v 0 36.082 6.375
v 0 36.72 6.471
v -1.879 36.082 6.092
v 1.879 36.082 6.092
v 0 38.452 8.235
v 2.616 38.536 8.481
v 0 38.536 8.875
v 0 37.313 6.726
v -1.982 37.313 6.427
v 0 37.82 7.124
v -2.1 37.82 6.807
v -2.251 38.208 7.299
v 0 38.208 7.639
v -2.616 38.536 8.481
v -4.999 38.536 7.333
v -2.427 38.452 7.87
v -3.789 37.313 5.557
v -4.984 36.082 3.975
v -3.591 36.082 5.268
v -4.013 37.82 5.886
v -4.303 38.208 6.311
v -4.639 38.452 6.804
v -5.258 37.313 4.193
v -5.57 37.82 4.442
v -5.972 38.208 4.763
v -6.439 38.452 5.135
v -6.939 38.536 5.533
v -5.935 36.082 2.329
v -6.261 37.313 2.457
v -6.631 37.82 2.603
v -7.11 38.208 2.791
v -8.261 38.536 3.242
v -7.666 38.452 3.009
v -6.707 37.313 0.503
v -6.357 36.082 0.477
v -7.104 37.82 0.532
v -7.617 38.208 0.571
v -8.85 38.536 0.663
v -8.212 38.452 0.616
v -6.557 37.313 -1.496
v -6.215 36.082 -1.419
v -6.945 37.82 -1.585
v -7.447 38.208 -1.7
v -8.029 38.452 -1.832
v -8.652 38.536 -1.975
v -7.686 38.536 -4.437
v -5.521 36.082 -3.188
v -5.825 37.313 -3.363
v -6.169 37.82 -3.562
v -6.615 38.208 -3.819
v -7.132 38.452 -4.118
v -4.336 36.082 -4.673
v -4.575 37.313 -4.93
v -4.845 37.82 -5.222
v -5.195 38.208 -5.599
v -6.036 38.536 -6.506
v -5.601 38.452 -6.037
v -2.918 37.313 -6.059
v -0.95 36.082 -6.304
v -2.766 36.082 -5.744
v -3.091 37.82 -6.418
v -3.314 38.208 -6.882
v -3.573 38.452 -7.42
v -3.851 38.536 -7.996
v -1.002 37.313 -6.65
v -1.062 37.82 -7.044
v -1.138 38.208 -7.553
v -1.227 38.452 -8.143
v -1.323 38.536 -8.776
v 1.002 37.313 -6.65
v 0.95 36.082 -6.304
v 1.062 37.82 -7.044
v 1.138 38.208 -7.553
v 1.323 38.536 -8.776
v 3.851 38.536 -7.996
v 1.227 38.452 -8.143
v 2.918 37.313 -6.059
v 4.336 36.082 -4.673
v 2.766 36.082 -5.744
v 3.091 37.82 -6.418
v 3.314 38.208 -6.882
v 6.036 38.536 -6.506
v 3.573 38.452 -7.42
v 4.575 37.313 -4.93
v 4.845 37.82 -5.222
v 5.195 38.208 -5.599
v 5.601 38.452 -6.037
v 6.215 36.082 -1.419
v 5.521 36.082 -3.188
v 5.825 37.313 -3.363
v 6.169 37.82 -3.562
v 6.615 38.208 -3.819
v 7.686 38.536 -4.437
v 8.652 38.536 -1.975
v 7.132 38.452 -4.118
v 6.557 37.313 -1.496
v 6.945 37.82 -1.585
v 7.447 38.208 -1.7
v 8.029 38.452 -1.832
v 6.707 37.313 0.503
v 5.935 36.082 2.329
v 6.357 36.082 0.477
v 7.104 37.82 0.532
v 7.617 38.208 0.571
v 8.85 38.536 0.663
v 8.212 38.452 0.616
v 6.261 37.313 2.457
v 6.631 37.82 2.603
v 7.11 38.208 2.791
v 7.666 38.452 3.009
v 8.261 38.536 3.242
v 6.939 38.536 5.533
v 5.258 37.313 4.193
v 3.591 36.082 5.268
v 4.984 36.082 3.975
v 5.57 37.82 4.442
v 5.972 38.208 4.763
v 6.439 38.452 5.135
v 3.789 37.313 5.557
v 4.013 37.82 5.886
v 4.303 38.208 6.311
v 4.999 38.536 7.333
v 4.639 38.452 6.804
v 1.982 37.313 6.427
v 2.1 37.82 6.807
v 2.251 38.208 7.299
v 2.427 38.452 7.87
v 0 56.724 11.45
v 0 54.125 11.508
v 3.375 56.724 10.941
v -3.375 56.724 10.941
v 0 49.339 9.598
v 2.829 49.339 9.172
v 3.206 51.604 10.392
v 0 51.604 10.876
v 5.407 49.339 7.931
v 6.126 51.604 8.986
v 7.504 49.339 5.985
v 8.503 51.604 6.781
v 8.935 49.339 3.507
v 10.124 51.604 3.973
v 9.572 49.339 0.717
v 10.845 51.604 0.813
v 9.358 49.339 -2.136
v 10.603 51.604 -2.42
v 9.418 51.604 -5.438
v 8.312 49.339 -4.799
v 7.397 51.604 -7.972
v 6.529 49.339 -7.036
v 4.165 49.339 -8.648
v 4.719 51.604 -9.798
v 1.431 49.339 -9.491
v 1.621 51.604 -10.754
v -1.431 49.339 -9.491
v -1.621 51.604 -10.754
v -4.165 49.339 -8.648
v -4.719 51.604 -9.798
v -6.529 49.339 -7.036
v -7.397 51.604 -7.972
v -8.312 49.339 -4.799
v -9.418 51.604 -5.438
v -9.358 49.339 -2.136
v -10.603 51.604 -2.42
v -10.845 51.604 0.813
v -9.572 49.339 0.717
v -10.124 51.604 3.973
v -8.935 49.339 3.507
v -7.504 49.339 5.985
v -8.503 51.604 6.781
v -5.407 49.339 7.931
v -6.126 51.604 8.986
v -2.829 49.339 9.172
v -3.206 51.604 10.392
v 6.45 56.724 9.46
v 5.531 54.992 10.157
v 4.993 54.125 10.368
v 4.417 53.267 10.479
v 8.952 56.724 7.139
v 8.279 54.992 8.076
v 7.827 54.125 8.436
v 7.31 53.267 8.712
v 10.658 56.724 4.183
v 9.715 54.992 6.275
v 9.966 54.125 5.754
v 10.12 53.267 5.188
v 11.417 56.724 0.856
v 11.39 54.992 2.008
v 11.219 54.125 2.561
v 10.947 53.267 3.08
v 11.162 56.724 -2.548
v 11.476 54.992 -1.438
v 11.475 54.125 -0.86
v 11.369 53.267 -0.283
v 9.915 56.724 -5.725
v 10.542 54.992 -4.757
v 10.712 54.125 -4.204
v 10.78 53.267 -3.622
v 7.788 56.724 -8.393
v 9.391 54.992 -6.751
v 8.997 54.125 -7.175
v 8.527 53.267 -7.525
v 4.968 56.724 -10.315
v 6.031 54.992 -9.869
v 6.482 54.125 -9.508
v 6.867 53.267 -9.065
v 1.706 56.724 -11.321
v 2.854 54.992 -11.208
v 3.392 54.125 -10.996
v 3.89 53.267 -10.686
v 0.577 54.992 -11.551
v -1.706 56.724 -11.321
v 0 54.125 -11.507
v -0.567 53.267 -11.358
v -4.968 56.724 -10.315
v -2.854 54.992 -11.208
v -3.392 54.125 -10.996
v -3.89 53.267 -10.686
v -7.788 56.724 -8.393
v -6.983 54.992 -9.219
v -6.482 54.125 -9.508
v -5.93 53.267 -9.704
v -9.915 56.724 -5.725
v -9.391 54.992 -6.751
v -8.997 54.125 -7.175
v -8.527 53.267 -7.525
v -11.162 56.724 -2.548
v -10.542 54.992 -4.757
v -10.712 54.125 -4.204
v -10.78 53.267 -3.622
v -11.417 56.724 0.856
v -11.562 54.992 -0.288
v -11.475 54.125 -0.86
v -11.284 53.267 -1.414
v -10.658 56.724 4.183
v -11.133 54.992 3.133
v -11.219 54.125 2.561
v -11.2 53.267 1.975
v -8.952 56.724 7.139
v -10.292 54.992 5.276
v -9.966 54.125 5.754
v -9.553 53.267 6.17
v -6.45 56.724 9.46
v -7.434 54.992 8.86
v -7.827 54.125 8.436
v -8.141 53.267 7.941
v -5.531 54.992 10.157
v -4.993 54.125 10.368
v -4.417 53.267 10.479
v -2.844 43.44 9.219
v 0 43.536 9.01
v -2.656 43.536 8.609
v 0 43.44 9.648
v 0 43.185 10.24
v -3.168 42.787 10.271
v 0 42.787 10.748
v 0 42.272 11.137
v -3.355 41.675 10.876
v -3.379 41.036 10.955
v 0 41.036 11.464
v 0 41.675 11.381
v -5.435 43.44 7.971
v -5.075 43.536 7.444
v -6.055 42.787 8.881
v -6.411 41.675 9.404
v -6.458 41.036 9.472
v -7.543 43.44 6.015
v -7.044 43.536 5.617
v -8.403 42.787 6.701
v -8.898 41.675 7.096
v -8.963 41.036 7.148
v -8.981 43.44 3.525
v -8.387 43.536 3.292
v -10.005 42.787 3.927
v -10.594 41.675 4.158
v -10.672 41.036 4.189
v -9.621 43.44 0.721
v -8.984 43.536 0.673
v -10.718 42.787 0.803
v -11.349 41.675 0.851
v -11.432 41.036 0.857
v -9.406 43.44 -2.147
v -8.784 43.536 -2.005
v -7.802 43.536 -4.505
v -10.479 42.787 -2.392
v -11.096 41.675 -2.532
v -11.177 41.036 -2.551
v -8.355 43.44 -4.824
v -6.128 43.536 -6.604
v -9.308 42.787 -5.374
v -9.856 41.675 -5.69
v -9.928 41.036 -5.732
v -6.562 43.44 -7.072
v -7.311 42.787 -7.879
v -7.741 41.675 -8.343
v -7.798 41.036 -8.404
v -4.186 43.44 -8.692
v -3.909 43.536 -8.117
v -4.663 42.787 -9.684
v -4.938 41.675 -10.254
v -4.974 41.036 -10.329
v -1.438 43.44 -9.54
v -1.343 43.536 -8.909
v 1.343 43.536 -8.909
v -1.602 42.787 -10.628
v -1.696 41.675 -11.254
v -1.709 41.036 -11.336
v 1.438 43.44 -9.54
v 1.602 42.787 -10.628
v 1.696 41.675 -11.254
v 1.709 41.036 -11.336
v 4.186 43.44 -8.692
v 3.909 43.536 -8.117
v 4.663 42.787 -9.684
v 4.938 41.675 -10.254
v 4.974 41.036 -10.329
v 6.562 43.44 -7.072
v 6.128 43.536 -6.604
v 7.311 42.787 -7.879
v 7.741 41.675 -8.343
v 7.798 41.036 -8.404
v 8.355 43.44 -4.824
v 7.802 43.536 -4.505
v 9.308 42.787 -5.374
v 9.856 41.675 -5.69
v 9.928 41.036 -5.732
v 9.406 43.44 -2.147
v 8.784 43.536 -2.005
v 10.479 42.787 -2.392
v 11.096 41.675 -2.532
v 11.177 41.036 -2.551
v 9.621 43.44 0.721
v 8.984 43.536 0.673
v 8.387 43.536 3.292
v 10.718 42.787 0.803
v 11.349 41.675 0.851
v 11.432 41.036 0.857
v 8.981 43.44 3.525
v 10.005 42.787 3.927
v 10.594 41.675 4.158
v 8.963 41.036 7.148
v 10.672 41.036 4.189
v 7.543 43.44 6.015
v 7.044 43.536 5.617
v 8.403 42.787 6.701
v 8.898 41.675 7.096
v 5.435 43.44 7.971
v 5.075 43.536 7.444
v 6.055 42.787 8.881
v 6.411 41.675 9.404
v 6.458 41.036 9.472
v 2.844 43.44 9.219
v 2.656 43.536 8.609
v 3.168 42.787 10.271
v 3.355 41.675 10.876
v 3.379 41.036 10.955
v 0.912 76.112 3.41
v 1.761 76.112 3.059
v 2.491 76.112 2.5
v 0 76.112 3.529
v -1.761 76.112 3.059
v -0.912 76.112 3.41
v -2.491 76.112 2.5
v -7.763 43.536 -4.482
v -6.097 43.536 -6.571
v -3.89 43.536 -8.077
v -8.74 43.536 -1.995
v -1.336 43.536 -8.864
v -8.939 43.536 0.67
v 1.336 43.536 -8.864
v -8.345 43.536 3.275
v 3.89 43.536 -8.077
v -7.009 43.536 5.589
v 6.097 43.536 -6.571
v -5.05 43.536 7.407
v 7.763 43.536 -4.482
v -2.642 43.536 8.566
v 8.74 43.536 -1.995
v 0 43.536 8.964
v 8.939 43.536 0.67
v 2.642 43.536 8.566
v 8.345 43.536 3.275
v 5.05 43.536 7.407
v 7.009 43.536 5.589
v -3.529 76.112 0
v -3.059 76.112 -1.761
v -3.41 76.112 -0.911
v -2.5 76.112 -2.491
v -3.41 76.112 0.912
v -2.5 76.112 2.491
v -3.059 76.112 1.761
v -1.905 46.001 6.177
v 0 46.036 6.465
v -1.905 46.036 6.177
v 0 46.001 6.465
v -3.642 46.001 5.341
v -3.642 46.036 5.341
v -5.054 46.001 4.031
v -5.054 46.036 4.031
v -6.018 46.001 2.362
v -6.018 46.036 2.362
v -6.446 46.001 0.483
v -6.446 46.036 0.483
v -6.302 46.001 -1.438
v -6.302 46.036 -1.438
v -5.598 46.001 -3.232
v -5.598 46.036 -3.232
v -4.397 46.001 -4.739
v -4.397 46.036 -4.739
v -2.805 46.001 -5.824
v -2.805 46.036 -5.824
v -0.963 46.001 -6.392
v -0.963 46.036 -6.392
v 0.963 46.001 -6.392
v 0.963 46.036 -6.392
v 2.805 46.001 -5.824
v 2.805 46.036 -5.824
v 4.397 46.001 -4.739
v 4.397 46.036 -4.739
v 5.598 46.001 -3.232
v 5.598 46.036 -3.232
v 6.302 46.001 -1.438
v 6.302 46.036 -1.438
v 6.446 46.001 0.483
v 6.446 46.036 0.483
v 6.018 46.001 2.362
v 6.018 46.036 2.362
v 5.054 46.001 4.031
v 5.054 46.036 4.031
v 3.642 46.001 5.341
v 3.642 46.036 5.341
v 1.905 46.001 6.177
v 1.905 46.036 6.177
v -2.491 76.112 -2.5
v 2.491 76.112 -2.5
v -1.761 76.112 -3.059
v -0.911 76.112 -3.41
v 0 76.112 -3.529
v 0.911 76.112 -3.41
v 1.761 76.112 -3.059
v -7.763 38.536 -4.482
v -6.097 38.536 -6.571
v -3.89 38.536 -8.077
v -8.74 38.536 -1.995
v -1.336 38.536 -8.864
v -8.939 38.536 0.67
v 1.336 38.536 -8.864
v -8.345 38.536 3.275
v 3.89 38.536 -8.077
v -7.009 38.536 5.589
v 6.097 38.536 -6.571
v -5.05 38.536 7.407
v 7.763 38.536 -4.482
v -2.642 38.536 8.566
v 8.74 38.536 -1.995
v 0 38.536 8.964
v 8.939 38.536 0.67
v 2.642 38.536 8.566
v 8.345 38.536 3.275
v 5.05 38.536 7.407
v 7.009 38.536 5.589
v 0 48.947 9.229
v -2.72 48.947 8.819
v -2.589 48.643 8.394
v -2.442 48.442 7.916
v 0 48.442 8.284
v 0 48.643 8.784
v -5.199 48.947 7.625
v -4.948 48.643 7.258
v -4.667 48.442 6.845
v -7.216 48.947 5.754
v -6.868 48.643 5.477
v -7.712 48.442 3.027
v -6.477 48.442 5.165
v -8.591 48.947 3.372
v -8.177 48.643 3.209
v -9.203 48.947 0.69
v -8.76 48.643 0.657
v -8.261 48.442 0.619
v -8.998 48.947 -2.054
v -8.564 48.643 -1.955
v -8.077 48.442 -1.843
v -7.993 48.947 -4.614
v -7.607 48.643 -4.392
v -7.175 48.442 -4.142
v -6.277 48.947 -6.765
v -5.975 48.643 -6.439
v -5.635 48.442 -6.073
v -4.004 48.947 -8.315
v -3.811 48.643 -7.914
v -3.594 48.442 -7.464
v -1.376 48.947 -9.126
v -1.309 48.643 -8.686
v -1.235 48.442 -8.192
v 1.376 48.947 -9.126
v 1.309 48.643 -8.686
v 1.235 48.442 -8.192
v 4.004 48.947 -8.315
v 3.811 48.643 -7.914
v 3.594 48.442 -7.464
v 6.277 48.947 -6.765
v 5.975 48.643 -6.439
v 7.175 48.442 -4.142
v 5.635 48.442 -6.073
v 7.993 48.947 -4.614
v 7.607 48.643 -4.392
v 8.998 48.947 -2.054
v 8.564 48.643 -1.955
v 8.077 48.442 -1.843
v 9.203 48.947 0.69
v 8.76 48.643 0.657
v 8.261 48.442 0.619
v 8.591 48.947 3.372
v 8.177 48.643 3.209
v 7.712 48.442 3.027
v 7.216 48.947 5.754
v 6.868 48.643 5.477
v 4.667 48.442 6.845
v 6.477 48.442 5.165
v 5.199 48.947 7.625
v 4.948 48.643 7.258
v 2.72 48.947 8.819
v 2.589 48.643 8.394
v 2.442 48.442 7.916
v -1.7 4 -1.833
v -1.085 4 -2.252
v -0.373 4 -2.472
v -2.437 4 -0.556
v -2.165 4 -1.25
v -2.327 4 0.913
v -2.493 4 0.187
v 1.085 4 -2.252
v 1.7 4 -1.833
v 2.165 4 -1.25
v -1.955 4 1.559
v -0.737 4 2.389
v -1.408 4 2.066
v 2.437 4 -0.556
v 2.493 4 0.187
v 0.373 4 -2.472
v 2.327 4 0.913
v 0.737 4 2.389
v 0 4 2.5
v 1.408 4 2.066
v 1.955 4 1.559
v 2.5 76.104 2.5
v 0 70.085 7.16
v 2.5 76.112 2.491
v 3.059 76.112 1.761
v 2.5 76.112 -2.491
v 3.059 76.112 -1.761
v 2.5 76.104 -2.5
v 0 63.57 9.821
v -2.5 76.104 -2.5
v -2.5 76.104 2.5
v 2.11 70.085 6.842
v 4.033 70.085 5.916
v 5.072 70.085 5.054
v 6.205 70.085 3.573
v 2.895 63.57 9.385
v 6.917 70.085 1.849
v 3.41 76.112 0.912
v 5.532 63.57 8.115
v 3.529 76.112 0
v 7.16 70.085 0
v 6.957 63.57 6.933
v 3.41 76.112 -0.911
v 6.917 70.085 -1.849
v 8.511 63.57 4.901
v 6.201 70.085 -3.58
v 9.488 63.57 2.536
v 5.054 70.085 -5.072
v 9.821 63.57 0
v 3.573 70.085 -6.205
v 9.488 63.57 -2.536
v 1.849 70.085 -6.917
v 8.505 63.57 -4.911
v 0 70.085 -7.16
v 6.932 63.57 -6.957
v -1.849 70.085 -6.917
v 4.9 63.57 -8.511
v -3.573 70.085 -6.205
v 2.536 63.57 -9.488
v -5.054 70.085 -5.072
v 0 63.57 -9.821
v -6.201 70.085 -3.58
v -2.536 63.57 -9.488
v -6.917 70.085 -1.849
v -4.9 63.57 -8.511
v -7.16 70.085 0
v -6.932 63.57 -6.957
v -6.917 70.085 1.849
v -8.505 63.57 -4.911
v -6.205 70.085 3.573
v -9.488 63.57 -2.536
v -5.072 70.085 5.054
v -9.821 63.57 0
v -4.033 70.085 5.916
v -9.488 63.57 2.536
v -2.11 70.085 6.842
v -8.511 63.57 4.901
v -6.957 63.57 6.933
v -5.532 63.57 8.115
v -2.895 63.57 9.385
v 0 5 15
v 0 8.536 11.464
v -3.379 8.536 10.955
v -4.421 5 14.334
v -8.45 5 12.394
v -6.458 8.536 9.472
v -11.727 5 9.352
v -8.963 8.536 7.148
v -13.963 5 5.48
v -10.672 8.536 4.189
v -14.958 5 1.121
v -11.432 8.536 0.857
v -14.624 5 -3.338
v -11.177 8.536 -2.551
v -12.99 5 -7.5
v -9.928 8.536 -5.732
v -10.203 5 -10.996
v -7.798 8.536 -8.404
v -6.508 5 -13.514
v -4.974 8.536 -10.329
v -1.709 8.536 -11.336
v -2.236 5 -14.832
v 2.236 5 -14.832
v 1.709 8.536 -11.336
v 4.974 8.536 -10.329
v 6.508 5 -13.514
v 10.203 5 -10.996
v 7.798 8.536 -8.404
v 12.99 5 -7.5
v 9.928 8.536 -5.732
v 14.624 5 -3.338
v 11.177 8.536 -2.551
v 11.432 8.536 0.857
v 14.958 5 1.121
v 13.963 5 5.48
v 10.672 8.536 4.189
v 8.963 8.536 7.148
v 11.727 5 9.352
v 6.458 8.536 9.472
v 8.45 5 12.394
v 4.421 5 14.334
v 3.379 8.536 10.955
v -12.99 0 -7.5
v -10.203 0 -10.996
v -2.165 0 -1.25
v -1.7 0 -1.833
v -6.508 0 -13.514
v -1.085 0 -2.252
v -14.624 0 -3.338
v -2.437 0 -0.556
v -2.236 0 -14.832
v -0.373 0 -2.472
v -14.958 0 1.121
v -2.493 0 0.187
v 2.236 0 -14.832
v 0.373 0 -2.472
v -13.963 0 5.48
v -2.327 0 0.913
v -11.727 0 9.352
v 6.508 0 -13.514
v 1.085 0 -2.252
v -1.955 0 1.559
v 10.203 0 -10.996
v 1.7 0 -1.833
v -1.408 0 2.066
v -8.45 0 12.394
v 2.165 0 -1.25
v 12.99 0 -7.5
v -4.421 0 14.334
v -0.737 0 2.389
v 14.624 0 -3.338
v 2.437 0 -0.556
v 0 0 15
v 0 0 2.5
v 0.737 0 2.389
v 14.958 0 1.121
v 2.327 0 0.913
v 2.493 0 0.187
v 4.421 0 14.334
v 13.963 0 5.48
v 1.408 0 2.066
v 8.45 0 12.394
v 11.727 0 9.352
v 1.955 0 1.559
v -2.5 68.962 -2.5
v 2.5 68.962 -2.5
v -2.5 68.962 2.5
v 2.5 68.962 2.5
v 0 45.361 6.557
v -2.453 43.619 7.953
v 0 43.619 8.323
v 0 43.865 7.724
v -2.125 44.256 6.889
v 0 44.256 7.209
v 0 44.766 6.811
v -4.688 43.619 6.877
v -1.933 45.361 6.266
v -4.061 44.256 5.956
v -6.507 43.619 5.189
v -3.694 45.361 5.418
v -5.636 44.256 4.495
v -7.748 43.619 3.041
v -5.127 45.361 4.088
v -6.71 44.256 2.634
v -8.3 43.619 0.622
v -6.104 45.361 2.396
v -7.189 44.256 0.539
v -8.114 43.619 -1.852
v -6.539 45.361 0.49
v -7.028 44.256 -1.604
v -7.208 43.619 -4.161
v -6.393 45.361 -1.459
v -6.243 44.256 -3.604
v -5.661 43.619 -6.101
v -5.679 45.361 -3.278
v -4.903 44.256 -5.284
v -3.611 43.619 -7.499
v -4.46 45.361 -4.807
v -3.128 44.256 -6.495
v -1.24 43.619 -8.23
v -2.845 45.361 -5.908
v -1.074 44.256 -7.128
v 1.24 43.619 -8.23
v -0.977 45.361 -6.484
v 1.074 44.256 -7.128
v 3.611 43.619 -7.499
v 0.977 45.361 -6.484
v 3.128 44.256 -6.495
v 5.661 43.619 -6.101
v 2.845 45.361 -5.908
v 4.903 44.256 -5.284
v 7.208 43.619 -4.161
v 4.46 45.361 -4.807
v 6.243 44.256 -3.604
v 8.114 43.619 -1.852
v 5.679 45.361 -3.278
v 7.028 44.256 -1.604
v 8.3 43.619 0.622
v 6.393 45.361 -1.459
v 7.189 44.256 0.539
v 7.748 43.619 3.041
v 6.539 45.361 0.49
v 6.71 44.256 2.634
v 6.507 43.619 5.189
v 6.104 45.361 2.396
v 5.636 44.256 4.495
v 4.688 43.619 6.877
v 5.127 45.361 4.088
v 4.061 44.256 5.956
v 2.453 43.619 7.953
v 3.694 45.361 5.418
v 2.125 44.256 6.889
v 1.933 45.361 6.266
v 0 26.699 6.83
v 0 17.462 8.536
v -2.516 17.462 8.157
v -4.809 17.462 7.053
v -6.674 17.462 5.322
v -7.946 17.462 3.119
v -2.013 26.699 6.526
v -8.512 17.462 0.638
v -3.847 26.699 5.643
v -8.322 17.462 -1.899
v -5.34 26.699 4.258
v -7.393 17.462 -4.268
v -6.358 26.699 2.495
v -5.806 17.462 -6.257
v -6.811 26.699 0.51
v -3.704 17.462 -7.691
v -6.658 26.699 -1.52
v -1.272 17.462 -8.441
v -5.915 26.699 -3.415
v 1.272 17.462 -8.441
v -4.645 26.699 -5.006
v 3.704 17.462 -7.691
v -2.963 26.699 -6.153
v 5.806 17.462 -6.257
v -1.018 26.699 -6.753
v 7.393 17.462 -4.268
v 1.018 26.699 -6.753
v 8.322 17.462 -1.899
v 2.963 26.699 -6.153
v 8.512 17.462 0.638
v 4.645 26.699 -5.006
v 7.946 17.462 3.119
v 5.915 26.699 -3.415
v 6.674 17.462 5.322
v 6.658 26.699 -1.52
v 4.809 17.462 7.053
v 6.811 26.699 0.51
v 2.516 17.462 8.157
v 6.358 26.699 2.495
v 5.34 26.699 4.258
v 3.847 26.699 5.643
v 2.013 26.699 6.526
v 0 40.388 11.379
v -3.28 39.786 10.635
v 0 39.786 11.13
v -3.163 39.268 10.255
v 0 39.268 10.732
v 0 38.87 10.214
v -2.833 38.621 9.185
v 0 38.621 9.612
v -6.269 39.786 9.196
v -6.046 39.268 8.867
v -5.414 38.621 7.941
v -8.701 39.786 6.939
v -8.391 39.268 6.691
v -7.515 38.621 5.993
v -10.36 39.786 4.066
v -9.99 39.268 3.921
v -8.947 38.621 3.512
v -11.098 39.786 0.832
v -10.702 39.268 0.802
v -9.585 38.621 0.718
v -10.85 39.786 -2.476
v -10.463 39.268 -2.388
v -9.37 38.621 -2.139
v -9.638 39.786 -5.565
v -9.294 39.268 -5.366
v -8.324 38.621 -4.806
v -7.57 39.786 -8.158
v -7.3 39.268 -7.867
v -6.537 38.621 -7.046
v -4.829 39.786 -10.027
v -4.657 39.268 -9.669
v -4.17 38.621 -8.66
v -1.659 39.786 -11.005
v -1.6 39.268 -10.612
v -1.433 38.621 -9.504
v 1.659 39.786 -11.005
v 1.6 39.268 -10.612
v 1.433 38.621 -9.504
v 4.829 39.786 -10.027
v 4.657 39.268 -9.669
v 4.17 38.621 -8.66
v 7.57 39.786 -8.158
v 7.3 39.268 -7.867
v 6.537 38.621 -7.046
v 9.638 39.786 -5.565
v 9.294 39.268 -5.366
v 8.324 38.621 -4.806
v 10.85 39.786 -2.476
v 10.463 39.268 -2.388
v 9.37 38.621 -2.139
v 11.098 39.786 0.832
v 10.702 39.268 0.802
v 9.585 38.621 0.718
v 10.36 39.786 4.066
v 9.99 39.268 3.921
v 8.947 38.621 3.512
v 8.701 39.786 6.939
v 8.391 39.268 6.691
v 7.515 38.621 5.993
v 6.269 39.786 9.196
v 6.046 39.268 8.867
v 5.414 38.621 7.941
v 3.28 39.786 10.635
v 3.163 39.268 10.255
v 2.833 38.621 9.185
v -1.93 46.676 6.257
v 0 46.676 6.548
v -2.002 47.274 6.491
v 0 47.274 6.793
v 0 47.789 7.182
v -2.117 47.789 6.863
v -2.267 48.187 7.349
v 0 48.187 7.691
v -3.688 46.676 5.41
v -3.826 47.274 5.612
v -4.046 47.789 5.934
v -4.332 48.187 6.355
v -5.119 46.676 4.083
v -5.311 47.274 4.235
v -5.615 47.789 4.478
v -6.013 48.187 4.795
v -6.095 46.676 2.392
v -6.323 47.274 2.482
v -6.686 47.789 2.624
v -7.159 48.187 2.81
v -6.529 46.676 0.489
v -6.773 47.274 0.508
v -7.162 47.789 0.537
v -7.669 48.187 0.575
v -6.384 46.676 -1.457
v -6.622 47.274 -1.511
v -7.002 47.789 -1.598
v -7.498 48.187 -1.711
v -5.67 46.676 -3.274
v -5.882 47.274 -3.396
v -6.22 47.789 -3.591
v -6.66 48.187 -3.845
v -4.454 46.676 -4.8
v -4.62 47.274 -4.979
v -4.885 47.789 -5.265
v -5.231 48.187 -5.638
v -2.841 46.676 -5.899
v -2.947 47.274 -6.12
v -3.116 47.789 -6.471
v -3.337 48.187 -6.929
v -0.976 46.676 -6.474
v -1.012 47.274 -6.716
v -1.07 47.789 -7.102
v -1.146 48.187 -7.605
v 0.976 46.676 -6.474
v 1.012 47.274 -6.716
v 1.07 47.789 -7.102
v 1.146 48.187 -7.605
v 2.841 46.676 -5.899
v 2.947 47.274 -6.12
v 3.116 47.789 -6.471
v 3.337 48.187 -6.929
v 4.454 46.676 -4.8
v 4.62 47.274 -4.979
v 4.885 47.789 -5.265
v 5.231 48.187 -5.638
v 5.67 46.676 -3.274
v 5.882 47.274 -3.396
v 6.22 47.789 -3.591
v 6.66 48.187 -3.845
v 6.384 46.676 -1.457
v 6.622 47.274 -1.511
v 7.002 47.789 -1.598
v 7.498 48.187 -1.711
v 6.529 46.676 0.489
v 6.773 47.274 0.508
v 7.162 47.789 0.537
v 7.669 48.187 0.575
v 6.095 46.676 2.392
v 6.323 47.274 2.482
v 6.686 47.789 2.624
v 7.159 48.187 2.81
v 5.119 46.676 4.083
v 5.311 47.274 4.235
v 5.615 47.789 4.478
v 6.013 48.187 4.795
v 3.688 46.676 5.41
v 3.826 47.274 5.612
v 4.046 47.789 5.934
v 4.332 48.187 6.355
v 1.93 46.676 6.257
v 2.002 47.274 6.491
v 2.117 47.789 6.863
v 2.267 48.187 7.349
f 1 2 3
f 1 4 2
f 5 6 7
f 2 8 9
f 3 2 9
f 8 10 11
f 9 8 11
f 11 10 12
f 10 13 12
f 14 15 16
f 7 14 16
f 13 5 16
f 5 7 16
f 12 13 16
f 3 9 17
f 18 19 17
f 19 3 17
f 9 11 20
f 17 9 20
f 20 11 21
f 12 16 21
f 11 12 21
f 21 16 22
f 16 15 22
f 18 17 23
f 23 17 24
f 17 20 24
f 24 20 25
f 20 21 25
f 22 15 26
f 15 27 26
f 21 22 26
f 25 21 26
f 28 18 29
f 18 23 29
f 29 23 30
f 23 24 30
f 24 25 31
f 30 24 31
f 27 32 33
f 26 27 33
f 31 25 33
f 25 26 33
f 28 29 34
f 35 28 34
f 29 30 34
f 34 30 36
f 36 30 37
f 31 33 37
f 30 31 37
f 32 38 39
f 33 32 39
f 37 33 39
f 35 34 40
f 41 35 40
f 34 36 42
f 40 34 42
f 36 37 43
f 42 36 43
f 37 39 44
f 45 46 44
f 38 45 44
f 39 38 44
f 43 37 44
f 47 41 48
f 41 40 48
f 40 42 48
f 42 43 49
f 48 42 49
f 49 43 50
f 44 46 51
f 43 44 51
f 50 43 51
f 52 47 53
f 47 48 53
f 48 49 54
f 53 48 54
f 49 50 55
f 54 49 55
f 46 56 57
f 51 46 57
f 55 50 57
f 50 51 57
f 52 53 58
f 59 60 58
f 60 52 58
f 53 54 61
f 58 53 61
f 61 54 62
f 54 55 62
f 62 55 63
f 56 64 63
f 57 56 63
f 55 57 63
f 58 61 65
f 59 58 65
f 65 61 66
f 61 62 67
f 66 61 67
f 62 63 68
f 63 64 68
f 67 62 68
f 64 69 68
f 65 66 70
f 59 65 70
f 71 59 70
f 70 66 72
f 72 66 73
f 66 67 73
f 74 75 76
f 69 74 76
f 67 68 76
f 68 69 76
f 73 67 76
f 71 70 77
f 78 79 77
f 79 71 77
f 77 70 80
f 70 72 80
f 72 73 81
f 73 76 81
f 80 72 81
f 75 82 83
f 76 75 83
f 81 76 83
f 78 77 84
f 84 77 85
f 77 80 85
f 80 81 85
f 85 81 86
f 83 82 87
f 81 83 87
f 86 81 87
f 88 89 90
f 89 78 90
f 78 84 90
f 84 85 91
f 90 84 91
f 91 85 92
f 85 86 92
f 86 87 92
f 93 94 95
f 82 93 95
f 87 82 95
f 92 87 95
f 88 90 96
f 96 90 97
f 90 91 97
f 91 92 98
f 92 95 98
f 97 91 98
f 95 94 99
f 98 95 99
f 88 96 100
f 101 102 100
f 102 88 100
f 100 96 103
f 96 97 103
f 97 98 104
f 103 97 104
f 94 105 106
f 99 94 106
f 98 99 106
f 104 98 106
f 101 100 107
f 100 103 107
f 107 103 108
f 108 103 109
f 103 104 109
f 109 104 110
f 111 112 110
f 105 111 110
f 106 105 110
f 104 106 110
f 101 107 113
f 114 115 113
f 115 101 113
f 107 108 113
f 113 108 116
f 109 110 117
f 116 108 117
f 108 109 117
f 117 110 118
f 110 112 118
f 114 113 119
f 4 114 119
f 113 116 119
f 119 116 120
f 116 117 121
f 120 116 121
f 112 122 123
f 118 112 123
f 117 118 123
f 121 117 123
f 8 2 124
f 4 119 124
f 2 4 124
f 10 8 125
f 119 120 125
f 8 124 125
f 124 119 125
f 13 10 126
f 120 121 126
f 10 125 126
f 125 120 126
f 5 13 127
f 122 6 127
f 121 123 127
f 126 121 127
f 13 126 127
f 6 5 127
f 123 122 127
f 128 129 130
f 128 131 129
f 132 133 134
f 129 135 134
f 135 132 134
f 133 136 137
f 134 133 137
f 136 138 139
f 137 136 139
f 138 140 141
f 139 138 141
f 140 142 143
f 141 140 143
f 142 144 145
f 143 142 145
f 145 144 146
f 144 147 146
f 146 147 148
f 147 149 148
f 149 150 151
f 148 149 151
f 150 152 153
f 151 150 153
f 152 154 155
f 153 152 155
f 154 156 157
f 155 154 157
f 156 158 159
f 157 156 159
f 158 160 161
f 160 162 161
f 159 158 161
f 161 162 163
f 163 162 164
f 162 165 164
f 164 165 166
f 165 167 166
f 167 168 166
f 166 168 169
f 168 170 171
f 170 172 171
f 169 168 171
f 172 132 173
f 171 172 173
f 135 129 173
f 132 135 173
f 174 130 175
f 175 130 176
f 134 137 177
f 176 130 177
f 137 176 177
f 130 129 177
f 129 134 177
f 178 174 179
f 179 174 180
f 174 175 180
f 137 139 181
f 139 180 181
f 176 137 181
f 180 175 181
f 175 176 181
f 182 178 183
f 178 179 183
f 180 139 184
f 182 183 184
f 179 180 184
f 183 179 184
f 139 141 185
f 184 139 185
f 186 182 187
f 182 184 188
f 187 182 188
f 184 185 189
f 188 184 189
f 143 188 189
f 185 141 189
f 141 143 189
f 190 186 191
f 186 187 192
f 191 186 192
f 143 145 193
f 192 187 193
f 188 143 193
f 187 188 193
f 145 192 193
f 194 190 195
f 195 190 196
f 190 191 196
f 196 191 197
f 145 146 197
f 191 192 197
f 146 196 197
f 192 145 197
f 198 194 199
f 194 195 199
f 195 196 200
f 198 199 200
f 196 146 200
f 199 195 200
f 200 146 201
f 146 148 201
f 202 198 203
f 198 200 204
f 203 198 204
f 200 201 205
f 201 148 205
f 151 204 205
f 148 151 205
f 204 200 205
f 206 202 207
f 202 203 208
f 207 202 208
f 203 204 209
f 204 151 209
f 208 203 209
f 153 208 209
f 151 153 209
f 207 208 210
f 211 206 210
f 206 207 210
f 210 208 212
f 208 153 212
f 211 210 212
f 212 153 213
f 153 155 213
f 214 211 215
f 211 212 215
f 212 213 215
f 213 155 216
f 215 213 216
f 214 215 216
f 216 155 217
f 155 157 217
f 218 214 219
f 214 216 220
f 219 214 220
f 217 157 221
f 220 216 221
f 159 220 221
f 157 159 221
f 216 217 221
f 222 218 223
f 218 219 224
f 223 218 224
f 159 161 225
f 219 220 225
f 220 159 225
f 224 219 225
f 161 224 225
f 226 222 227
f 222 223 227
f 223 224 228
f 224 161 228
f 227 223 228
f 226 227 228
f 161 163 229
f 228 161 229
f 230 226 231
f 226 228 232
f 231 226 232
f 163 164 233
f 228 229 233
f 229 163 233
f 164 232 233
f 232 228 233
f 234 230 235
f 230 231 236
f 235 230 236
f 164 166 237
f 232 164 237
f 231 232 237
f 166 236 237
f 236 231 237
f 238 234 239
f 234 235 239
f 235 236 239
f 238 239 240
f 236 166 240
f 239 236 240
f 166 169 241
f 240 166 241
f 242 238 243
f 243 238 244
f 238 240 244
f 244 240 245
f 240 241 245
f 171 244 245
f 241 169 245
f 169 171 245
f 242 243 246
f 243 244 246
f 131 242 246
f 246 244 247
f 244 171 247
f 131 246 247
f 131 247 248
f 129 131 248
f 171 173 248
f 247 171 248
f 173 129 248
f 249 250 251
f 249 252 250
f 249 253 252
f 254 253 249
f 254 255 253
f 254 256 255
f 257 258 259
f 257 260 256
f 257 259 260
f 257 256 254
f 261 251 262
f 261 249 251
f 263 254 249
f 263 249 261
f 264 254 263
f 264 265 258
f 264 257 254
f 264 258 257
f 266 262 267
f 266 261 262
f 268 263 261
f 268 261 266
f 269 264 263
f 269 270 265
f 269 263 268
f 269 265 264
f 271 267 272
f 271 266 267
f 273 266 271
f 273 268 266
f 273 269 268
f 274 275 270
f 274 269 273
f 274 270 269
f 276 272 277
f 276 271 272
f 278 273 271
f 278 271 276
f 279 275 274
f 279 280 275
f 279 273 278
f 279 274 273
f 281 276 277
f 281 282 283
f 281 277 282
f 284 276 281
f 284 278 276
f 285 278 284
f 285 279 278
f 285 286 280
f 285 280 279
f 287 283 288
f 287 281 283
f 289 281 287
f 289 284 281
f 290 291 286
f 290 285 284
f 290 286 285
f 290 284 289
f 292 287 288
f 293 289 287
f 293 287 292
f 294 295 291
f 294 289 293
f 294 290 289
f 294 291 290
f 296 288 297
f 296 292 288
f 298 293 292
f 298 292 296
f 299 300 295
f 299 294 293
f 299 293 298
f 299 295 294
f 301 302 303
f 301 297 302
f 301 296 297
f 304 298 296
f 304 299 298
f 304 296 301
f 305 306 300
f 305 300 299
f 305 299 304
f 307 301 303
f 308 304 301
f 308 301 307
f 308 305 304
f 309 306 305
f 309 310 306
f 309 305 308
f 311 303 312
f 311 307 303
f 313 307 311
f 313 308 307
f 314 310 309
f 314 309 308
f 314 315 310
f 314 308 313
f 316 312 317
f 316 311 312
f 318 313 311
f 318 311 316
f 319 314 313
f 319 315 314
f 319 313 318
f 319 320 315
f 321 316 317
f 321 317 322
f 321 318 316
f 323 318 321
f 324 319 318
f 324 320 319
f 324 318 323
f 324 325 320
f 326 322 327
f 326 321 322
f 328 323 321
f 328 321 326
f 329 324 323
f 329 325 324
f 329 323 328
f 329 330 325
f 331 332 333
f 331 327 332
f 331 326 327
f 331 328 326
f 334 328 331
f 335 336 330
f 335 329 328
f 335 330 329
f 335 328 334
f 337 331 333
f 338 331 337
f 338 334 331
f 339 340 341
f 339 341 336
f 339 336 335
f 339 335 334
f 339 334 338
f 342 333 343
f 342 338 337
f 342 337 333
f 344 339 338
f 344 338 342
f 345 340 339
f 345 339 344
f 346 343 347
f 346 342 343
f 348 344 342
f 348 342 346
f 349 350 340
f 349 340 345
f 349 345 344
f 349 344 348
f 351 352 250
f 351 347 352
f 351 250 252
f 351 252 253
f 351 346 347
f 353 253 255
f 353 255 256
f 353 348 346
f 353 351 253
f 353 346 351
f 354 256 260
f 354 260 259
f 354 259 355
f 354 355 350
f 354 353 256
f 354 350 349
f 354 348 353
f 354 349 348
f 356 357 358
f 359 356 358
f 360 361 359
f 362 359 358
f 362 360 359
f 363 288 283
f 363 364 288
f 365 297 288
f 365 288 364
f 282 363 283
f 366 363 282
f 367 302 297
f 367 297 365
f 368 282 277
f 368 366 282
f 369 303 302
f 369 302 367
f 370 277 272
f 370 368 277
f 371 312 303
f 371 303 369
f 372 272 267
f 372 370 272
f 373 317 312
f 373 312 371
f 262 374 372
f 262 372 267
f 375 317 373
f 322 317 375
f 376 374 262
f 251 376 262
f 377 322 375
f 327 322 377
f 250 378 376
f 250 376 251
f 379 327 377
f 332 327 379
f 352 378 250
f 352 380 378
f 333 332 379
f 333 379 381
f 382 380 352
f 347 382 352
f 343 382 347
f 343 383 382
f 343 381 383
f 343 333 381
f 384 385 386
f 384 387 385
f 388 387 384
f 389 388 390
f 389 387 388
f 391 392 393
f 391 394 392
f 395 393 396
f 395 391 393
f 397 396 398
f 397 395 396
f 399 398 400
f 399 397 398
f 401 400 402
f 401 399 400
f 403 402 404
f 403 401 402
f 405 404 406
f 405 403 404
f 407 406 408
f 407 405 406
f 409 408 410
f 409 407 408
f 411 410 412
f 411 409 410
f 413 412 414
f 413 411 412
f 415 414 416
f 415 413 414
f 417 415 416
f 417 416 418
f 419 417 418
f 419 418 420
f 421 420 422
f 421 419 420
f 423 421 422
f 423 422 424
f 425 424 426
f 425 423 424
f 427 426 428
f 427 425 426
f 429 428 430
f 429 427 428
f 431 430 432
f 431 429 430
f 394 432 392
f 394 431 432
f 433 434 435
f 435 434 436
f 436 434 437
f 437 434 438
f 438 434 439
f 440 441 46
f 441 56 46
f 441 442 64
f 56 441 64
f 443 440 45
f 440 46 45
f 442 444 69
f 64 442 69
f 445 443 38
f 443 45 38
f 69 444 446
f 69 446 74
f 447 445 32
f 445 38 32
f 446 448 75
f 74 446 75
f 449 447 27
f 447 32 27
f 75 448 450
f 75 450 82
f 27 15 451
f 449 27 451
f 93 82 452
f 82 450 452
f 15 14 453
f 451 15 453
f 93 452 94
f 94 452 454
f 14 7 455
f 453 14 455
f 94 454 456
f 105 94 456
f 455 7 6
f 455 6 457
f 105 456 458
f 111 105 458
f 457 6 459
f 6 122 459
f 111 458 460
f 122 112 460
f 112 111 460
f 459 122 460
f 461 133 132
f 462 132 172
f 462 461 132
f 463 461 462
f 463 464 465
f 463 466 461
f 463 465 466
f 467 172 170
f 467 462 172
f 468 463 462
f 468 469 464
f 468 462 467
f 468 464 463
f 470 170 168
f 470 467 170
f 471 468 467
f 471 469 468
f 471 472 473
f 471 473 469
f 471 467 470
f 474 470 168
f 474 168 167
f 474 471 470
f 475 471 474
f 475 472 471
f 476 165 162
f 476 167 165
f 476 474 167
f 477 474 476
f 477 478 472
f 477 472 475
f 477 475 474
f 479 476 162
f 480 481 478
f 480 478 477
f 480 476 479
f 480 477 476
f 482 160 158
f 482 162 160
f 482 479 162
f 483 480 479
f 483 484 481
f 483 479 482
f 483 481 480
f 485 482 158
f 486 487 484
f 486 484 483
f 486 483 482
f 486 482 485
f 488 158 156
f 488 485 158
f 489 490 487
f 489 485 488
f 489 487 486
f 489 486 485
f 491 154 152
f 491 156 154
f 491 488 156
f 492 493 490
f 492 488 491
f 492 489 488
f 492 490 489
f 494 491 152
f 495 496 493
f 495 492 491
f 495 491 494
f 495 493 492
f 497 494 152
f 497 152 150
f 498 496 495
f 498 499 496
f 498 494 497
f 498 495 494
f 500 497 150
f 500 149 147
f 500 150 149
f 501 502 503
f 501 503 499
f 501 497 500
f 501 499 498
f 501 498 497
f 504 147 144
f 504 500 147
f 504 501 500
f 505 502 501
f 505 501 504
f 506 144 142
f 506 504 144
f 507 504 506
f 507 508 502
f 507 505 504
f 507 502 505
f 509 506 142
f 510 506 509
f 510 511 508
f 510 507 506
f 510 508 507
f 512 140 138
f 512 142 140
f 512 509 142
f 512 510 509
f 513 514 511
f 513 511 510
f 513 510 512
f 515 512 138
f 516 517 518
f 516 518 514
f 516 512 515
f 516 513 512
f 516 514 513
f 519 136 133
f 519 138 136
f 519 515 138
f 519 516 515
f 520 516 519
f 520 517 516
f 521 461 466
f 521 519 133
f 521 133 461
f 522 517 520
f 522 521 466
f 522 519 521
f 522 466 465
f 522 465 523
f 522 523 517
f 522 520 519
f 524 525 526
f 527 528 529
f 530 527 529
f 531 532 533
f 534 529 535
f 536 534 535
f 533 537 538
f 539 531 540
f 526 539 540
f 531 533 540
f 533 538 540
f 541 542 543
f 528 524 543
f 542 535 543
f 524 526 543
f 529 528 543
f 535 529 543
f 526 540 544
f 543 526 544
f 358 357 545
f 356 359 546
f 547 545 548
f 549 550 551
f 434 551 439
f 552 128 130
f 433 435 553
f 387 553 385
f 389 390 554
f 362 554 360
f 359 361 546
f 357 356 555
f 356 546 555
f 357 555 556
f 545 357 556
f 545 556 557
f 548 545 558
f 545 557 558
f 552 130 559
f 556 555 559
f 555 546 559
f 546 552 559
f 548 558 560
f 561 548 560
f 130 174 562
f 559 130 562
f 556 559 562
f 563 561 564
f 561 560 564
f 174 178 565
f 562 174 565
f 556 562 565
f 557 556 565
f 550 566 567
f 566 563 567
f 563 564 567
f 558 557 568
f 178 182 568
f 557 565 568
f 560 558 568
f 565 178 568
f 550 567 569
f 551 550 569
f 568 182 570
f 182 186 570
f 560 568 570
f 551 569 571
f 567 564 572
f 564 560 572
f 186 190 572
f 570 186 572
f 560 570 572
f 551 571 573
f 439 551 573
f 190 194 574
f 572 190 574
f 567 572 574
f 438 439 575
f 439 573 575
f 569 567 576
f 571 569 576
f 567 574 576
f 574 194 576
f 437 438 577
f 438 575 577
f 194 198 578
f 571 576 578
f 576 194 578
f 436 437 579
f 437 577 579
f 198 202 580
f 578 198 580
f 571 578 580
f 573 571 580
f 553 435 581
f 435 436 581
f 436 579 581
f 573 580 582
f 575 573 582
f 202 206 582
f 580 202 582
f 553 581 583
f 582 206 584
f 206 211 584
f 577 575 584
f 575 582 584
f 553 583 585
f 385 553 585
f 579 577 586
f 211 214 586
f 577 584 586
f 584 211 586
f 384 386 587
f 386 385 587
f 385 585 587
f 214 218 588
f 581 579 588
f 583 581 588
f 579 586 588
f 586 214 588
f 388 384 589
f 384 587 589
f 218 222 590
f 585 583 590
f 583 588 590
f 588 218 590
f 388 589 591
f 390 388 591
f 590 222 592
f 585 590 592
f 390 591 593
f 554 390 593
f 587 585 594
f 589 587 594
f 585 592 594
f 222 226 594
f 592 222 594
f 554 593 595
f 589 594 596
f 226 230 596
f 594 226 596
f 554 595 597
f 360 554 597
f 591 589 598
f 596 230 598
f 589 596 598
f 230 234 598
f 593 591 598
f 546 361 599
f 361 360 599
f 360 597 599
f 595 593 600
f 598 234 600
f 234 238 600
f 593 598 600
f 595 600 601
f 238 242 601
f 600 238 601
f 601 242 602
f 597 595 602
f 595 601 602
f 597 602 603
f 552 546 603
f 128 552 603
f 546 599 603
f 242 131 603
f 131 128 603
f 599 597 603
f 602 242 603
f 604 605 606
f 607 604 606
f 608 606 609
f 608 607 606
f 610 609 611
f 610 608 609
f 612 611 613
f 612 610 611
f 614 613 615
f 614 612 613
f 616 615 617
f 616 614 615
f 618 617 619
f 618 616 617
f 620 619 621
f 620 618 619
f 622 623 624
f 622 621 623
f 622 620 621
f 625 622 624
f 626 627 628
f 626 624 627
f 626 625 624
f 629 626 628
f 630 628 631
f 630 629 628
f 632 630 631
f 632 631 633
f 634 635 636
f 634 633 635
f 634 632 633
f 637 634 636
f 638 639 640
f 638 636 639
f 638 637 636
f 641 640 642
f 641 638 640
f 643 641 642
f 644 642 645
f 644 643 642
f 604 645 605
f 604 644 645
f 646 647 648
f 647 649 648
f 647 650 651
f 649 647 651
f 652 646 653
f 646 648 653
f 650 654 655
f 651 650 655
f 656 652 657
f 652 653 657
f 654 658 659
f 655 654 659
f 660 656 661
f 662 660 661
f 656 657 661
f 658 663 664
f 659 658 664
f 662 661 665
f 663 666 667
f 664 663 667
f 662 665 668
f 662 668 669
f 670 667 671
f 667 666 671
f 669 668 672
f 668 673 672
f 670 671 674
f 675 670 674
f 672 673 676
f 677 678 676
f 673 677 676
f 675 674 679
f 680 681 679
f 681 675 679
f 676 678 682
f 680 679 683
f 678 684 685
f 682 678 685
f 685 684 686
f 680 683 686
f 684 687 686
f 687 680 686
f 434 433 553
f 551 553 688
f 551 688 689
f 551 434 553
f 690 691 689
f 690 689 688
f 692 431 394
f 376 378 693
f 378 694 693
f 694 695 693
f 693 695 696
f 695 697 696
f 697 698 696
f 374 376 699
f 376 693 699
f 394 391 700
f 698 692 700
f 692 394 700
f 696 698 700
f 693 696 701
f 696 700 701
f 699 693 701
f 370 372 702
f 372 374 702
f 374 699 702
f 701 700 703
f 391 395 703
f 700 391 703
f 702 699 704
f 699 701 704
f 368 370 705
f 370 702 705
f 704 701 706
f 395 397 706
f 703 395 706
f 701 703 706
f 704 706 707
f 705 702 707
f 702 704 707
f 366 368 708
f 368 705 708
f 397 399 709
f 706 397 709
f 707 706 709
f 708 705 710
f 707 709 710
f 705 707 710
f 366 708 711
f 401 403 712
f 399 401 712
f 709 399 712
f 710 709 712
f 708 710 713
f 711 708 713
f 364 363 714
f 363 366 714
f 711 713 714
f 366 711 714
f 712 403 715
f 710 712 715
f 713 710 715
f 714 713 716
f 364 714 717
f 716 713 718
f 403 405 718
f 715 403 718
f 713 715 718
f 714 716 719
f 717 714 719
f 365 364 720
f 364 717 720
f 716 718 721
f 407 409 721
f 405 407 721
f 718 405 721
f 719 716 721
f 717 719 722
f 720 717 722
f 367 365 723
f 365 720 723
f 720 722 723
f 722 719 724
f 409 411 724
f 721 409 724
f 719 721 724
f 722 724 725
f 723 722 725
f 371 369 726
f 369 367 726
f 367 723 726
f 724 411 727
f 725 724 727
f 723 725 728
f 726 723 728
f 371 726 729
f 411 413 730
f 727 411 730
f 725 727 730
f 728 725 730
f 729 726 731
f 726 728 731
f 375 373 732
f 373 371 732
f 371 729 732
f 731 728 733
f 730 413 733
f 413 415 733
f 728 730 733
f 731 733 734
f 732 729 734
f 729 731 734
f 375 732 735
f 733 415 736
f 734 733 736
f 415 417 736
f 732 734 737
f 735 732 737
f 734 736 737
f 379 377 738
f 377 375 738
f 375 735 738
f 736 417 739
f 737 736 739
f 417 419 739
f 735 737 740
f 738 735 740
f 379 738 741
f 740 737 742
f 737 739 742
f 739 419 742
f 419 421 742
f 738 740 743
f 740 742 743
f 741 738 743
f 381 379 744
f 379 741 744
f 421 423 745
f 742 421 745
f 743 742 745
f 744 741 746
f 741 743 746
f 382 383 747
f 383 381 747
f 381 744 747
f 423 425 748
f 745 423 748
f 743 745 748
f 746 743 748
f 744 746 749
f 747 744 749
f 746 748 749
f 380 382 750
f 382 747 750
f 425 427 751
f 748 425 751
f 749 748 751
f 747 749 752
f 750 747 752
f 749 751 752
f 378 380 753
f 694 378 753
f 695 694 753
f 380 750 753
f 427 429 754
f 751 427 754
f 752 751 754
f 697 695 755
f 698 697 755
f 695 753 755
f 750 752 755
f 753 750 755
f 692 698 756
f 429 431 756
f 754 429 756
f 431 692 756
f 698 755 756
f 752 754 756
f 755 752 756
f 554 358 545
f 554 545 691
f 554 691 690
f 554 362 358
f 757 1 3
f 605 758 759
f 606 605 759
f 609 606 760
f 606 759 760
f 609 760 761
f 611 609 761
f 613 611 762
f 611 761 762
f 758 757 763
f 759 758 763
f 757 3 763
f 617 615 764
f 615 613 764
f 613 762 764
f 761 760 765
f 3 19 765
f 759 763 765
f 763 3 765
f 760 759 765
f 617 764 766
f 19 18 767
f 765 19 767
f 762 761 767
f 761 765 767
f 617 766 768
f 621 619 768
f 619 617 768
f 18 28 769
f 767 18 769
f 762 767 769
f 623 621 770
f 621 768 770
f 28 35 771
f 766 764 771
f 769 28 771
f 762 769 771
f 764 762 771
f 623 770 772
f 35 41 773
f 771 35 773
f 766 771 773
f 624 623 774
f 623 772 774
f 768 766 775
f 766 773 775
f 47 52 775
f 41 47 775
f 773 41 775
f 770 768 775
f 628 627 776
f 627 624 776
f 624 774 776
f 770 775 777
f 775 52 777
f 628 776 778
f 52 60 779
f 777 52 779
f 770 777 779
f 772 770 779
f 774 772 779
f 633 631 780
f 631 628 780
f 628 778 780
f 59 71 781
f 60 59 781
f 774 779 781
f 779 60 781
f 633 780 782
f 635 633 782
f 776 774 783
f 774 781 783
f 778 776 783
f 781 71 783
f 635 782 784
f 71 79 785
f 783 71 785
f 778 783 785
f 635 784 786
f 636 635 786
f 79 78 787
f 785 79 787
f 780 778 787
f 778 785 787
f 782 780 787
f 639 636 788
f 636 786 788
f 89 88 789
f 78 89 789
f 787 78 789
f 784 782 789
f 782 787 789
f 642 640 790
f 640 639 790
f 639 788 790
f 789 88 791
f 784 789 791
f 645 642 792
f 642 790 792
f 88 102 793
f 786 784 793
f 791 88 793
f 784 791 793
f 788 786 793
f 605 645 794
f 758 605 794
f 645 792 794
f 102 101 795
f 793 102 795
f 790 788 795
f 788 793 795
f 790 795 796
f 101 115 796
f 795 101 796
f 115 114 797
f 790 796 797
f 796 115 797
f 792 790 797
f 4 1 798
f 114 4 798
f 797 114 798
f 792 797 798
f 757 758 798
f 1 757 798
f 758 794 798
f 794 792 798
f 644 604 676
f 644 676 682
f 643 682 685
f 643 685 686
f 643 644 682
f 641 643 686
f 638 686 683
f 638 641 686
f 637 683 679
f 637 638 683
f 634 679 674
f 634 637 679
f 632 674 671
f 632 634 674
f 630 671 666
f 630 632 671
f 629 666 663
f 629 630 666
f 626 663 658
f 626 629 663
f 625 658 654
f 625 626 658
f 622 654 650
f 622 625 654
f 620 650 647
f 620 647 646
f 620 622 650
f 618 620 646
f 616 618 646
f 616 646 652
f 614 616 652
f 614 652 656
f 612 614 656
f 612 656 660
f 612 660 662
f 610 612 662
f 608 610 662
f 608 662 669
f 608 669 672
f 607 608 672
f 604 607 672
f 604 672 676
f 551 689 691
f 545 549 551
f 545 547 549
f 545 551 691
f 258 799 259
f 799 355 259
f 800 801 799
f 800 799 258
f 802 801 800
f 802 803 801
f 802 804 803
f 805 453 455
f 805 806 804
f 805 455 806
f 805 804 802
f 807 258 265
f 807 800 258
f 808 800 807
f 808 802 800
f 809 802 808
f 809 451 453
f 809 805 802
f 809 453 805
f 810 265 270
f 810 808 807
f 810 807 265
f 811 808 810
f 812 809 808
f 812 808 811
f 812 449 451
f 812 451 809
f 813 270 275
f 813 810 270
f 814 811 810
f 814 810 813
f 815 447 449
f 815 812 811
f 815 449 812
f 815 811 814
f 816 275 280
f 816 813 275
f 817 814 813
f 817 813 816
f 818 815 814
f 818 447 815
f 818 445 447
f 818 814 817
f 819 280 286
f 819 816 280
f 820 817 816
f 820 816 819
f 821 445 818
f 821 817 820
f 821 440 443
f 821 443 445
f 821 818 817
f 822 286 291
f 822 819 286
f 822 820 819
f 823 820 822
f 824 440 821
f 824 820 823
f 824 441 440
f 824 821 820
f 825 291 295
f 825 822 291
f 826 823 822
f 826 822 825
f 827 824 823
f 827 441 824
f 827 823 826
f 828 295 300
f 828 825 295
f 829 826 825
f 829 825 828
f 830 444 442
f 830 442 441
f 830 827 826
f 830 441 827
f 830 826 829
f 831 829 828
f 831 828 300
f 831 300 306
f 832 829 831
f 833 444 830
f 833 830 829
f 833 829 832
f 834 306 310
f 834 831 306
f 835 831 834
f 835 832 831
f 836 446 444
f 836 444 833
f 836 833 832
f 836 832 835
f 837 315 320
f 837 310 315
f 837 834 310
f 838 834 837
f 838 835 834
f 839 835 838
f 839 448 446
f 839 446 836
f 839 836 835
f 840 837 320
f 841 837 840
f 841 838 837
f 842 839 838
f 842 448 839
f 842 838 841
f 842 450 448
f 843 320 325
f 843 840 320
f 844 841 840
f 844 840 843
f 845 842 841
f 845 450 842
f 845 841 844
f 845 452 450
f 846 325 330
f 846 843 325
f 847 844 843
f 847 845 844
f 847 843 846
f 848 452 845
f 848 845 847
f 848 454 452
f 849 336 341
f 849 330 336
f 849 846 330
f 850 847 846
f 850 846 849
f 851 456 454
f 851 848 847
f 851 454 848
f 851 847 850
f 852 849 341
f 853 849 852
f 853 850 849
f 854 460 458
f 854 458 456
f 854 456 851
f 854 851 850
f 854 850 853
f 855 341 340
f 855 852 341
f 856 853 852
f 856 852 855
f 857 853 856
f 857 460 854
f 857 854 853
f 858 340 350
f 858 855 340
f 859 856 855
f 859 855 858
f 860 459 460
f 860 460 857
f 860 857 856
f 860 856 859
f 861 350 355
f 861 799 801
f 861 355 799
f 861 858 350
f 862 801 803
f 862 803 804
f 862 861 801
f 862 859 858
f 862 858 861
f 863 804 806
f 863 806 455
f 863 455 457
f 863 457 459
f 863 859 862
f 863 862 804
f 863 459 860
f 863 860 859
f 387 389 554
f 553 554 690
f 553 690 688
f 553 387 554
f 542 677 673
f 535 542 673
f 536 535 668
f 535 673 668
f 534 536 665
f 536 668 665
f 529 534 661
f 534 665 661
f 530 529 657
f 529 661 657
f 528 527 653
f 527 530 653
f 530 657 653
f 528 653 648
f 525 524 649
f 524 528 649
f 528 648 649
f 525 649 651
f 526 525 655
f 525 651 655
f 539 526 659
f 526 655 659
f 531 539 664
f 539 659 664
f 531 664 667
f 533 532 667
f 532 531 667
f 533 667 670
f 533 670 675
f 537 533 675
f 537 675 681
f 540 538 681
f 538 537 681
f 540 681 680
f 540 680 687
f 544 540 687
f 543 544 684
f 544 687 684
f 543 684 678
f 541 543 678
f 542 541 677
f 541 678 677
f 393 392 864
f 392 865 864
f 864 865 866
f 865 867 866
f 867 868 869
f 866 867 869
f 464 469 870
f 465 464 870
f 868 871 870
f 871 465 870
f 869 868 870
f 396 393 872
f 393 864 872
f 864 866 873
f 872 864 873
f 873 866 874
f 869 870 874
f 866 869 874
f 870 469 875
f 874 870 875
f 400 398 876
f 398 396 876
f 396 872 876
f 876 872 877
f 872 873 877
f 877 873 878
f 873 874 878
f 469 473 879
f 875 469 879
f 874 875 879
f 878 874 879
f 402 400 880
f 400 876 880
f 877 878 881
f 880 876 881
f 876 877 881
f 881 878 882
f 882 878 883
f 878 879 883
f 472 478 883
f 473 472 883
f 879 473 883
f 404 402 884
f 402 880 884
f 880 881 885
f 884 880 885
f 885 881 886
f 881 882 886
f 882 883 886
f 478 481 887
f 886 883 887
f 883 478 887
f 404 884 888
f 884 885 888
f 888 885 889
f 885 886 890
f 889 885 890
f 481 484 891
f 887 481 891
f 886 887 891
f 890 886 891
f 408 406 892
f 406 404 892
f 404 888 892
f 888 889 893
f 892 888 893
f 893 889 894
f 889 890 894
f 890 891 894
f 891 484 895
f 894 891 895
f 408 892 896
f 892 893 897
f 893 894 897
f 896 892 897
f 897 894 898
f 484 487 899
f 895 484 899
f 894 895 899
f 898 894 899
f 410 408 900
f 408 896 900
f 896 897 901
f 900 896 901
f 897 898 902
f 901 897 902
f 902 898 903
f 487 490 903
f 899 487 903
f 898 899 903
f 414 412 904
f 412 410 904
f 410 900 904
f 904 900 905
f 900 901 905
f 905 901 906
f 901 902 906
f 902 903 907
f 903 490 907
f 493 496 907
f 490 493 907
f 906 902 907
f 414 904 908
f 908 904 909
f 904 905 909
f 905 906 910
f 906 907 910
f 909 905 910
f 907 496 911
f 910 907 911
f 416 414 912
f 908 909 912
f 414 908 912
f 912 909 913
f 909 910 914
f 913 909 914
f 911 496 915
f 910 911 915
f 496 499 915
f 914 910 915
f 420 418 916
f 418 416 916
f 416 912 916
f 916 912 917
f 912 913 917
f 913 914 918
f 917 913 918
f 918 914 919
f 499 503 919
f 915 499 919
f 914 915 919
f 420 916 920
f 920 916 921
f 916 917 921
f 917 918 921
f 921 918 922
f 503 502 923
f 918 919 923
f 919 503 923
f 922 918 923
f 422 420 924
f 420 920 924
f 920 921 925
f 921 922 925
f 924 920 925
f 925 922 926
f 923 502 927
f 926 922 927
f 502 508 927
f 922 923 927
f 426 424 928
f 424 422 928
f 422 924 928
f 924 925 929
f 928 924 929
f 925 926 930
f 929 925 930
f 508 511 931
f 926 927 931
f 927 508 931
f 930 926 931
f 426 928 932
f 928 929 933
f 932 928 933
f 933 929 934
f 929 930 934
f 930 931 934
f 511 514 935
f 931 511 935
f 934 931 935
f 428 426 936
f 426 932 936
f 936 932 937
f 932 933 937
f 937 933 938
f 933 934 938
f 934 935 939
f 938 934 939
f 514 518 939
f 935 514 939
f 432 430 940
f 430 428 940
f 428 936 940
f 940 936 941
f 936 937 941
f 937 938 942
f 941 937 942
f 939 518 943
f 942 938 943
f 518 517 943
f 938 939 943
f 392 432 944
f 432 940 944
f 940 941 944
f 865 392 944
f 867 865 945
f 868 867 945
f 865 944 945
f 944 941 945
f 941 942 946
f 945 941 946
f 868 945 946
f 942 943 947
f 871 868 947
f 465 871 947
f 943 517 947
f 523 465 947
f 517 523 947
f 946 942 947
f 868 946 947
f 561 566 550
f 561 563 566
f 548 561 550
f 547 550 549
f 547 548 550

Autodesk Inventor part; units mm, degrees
ref_plane "YZ Plane" through (0, 0, 0) normal (1, 0, 0) x (0, 1, 0)
ref_plane "XY Plane" through (0, 0, 0) normal (0, 0, 1) x (1, 0, 0)
sketch "Sketch1" plane through (0, 0, 0) normal (1, 0, 0) x (0, 1, 0)
  line L0 (4, 0.0001) -> (4, 2.5001)
  line L1 (4, 2.5001) -> (0, 2.5001)
  line L2 (0, 2.5001) -> (0, 15)
  line L3 (0, 15) -> (5, 15)
  line L4 (5, 15) -> (8.5355, 11.4645)
  line L5 (38.5355, 8.8749) -> (38.5355, 8.9645)
  line L6 (41.0355, 11.4645) -> (41.0355, 11.4645)
  line L7 (43.5355, 8.9645) -> (43.5355, 9.0096)
  line L8 (46.0356, 6.4646) -> (46.0012, 6.4646)
  arc A0 (43.5355, 8.9645) -> (41.0355, 11.4645) centre (41.0355, 8.9645) ccw
  arc A1 (41.0355, 11.4645) -> (38.5355, 8.9645) centre (41.0355, 8.9645) ccw
  arc A2 (8.5355, 11.4645) -> (36.0825, 6.3754) centre (34.7686, 76.363) ccw
  line L9 (4, 0.0001) -> (80.0002, 0.0001)
  line L10 (46.0356, 6.4646) -> (46.0012, 6.4646)
  line L11 (80.0002, 0.0001) -> (80.0002, 0.0001)
  line L12 (77.5002, 2.5001) -> (77.5002, 2.5001)
  arc A3 (77.5002, 2.5001) -> (56.7241, 11.4495) centre (49.6175, -33.6394) ccw
  arc A4 (43.5355, 8.9645) -> (48.4415, 8.2845) centre (46.0356, 8.9645) ccw
  arc A5 (56.7241, 11.4495) -> (49.3393, 9.5985) centre (55.209, 1.837) ccw
  line L13 (80.0002, 0.0001) -> (80.0002, 0.0001)
  line L14 (77.5002, 2.5001) -> (77.5002, 2.5001)
  arc A6 (80.0002, 0.0001) -> (77.5002, 2.5001) centre (77.5002, 0.0001) ccw
  arc A7 (49.3393, 9.5985) -> (48.4415, 8.2845) centre (50.8472, 7.6045) ccw
  arc A8 (36.0825, 6.3754) -> (38.5355, 8.8749) centre (36.0355, 8.8749) ccw
  point P0 (0, 0)
  point P1 (38.5355, 6.4645)
  point P2 (38.5355, 11.4645)
  point P3 (43.5355, 11.4645)
  point P4 (43.5355, 6.4646)
  point P5 (80.0002, 2.5001)
  point P6 (77.5002, 2.5001)
  dimension "d0" = 4
  dimension "d1" = 2.5
  dimension "d2" = 15
  dimension "d3" = 5
  dimension "d4" = 5
  dimension "d5" = 135
  dimension "d25" = 5
  dimension "d26" = 5
  dimension "d36" = 70
  dimension "d47" = 2.5
  dimension "d48" = 2.5
  dimension "d49" = 2.5
  dimension "d51" = 2.5
revolve "Revolution1" add sketch "Sketch1" angle 360 about axis through (0, 4, 0.0001) along (0, 1, 0)
ref_plane "Work Plane1" through (0, 80.9625, 0) normal (0, 1, 0) x (-1, 0, 0)
sketch "Sketch2" plane through (0, 80.9625, 0) normal (0, 1, 0) x (-1, 0, 0)
  line L0 (2.5, -2.5) -> (-2.5, -2.5)
  line L1 (-2.5, -2.5) -> (-2.5, 2.5)
  line L2 (-2.5, 2.5) -> (2.5, 2.5)
  line L3 (2.5, 2.5) -> (2.5, -2.5)
  point P0 (0, 0)
  dimension "d53" = 5
  dimension "d54" = 2.5
  dimension "d55" = 2.5
  dimension "d56" = 5
extrude "Extrusion1" cut sketch "Sketch2" against normal blind 12
sketch "Sketch3" plane through (0, 80.9625, 0) normal (0, 1, 0) x (-1, 0, 0)
  circle A0 centre (0, 0.0001) radius 2.5 projected
  circle A1 centre (0, 0.0001) radius 3.5355
  point P0 (0, 0)
extrude "Extrusion2" cut sketch "Sketch3" against normal blind 4.85 contours A0 | A1
properties part number "PawnUntagged"
